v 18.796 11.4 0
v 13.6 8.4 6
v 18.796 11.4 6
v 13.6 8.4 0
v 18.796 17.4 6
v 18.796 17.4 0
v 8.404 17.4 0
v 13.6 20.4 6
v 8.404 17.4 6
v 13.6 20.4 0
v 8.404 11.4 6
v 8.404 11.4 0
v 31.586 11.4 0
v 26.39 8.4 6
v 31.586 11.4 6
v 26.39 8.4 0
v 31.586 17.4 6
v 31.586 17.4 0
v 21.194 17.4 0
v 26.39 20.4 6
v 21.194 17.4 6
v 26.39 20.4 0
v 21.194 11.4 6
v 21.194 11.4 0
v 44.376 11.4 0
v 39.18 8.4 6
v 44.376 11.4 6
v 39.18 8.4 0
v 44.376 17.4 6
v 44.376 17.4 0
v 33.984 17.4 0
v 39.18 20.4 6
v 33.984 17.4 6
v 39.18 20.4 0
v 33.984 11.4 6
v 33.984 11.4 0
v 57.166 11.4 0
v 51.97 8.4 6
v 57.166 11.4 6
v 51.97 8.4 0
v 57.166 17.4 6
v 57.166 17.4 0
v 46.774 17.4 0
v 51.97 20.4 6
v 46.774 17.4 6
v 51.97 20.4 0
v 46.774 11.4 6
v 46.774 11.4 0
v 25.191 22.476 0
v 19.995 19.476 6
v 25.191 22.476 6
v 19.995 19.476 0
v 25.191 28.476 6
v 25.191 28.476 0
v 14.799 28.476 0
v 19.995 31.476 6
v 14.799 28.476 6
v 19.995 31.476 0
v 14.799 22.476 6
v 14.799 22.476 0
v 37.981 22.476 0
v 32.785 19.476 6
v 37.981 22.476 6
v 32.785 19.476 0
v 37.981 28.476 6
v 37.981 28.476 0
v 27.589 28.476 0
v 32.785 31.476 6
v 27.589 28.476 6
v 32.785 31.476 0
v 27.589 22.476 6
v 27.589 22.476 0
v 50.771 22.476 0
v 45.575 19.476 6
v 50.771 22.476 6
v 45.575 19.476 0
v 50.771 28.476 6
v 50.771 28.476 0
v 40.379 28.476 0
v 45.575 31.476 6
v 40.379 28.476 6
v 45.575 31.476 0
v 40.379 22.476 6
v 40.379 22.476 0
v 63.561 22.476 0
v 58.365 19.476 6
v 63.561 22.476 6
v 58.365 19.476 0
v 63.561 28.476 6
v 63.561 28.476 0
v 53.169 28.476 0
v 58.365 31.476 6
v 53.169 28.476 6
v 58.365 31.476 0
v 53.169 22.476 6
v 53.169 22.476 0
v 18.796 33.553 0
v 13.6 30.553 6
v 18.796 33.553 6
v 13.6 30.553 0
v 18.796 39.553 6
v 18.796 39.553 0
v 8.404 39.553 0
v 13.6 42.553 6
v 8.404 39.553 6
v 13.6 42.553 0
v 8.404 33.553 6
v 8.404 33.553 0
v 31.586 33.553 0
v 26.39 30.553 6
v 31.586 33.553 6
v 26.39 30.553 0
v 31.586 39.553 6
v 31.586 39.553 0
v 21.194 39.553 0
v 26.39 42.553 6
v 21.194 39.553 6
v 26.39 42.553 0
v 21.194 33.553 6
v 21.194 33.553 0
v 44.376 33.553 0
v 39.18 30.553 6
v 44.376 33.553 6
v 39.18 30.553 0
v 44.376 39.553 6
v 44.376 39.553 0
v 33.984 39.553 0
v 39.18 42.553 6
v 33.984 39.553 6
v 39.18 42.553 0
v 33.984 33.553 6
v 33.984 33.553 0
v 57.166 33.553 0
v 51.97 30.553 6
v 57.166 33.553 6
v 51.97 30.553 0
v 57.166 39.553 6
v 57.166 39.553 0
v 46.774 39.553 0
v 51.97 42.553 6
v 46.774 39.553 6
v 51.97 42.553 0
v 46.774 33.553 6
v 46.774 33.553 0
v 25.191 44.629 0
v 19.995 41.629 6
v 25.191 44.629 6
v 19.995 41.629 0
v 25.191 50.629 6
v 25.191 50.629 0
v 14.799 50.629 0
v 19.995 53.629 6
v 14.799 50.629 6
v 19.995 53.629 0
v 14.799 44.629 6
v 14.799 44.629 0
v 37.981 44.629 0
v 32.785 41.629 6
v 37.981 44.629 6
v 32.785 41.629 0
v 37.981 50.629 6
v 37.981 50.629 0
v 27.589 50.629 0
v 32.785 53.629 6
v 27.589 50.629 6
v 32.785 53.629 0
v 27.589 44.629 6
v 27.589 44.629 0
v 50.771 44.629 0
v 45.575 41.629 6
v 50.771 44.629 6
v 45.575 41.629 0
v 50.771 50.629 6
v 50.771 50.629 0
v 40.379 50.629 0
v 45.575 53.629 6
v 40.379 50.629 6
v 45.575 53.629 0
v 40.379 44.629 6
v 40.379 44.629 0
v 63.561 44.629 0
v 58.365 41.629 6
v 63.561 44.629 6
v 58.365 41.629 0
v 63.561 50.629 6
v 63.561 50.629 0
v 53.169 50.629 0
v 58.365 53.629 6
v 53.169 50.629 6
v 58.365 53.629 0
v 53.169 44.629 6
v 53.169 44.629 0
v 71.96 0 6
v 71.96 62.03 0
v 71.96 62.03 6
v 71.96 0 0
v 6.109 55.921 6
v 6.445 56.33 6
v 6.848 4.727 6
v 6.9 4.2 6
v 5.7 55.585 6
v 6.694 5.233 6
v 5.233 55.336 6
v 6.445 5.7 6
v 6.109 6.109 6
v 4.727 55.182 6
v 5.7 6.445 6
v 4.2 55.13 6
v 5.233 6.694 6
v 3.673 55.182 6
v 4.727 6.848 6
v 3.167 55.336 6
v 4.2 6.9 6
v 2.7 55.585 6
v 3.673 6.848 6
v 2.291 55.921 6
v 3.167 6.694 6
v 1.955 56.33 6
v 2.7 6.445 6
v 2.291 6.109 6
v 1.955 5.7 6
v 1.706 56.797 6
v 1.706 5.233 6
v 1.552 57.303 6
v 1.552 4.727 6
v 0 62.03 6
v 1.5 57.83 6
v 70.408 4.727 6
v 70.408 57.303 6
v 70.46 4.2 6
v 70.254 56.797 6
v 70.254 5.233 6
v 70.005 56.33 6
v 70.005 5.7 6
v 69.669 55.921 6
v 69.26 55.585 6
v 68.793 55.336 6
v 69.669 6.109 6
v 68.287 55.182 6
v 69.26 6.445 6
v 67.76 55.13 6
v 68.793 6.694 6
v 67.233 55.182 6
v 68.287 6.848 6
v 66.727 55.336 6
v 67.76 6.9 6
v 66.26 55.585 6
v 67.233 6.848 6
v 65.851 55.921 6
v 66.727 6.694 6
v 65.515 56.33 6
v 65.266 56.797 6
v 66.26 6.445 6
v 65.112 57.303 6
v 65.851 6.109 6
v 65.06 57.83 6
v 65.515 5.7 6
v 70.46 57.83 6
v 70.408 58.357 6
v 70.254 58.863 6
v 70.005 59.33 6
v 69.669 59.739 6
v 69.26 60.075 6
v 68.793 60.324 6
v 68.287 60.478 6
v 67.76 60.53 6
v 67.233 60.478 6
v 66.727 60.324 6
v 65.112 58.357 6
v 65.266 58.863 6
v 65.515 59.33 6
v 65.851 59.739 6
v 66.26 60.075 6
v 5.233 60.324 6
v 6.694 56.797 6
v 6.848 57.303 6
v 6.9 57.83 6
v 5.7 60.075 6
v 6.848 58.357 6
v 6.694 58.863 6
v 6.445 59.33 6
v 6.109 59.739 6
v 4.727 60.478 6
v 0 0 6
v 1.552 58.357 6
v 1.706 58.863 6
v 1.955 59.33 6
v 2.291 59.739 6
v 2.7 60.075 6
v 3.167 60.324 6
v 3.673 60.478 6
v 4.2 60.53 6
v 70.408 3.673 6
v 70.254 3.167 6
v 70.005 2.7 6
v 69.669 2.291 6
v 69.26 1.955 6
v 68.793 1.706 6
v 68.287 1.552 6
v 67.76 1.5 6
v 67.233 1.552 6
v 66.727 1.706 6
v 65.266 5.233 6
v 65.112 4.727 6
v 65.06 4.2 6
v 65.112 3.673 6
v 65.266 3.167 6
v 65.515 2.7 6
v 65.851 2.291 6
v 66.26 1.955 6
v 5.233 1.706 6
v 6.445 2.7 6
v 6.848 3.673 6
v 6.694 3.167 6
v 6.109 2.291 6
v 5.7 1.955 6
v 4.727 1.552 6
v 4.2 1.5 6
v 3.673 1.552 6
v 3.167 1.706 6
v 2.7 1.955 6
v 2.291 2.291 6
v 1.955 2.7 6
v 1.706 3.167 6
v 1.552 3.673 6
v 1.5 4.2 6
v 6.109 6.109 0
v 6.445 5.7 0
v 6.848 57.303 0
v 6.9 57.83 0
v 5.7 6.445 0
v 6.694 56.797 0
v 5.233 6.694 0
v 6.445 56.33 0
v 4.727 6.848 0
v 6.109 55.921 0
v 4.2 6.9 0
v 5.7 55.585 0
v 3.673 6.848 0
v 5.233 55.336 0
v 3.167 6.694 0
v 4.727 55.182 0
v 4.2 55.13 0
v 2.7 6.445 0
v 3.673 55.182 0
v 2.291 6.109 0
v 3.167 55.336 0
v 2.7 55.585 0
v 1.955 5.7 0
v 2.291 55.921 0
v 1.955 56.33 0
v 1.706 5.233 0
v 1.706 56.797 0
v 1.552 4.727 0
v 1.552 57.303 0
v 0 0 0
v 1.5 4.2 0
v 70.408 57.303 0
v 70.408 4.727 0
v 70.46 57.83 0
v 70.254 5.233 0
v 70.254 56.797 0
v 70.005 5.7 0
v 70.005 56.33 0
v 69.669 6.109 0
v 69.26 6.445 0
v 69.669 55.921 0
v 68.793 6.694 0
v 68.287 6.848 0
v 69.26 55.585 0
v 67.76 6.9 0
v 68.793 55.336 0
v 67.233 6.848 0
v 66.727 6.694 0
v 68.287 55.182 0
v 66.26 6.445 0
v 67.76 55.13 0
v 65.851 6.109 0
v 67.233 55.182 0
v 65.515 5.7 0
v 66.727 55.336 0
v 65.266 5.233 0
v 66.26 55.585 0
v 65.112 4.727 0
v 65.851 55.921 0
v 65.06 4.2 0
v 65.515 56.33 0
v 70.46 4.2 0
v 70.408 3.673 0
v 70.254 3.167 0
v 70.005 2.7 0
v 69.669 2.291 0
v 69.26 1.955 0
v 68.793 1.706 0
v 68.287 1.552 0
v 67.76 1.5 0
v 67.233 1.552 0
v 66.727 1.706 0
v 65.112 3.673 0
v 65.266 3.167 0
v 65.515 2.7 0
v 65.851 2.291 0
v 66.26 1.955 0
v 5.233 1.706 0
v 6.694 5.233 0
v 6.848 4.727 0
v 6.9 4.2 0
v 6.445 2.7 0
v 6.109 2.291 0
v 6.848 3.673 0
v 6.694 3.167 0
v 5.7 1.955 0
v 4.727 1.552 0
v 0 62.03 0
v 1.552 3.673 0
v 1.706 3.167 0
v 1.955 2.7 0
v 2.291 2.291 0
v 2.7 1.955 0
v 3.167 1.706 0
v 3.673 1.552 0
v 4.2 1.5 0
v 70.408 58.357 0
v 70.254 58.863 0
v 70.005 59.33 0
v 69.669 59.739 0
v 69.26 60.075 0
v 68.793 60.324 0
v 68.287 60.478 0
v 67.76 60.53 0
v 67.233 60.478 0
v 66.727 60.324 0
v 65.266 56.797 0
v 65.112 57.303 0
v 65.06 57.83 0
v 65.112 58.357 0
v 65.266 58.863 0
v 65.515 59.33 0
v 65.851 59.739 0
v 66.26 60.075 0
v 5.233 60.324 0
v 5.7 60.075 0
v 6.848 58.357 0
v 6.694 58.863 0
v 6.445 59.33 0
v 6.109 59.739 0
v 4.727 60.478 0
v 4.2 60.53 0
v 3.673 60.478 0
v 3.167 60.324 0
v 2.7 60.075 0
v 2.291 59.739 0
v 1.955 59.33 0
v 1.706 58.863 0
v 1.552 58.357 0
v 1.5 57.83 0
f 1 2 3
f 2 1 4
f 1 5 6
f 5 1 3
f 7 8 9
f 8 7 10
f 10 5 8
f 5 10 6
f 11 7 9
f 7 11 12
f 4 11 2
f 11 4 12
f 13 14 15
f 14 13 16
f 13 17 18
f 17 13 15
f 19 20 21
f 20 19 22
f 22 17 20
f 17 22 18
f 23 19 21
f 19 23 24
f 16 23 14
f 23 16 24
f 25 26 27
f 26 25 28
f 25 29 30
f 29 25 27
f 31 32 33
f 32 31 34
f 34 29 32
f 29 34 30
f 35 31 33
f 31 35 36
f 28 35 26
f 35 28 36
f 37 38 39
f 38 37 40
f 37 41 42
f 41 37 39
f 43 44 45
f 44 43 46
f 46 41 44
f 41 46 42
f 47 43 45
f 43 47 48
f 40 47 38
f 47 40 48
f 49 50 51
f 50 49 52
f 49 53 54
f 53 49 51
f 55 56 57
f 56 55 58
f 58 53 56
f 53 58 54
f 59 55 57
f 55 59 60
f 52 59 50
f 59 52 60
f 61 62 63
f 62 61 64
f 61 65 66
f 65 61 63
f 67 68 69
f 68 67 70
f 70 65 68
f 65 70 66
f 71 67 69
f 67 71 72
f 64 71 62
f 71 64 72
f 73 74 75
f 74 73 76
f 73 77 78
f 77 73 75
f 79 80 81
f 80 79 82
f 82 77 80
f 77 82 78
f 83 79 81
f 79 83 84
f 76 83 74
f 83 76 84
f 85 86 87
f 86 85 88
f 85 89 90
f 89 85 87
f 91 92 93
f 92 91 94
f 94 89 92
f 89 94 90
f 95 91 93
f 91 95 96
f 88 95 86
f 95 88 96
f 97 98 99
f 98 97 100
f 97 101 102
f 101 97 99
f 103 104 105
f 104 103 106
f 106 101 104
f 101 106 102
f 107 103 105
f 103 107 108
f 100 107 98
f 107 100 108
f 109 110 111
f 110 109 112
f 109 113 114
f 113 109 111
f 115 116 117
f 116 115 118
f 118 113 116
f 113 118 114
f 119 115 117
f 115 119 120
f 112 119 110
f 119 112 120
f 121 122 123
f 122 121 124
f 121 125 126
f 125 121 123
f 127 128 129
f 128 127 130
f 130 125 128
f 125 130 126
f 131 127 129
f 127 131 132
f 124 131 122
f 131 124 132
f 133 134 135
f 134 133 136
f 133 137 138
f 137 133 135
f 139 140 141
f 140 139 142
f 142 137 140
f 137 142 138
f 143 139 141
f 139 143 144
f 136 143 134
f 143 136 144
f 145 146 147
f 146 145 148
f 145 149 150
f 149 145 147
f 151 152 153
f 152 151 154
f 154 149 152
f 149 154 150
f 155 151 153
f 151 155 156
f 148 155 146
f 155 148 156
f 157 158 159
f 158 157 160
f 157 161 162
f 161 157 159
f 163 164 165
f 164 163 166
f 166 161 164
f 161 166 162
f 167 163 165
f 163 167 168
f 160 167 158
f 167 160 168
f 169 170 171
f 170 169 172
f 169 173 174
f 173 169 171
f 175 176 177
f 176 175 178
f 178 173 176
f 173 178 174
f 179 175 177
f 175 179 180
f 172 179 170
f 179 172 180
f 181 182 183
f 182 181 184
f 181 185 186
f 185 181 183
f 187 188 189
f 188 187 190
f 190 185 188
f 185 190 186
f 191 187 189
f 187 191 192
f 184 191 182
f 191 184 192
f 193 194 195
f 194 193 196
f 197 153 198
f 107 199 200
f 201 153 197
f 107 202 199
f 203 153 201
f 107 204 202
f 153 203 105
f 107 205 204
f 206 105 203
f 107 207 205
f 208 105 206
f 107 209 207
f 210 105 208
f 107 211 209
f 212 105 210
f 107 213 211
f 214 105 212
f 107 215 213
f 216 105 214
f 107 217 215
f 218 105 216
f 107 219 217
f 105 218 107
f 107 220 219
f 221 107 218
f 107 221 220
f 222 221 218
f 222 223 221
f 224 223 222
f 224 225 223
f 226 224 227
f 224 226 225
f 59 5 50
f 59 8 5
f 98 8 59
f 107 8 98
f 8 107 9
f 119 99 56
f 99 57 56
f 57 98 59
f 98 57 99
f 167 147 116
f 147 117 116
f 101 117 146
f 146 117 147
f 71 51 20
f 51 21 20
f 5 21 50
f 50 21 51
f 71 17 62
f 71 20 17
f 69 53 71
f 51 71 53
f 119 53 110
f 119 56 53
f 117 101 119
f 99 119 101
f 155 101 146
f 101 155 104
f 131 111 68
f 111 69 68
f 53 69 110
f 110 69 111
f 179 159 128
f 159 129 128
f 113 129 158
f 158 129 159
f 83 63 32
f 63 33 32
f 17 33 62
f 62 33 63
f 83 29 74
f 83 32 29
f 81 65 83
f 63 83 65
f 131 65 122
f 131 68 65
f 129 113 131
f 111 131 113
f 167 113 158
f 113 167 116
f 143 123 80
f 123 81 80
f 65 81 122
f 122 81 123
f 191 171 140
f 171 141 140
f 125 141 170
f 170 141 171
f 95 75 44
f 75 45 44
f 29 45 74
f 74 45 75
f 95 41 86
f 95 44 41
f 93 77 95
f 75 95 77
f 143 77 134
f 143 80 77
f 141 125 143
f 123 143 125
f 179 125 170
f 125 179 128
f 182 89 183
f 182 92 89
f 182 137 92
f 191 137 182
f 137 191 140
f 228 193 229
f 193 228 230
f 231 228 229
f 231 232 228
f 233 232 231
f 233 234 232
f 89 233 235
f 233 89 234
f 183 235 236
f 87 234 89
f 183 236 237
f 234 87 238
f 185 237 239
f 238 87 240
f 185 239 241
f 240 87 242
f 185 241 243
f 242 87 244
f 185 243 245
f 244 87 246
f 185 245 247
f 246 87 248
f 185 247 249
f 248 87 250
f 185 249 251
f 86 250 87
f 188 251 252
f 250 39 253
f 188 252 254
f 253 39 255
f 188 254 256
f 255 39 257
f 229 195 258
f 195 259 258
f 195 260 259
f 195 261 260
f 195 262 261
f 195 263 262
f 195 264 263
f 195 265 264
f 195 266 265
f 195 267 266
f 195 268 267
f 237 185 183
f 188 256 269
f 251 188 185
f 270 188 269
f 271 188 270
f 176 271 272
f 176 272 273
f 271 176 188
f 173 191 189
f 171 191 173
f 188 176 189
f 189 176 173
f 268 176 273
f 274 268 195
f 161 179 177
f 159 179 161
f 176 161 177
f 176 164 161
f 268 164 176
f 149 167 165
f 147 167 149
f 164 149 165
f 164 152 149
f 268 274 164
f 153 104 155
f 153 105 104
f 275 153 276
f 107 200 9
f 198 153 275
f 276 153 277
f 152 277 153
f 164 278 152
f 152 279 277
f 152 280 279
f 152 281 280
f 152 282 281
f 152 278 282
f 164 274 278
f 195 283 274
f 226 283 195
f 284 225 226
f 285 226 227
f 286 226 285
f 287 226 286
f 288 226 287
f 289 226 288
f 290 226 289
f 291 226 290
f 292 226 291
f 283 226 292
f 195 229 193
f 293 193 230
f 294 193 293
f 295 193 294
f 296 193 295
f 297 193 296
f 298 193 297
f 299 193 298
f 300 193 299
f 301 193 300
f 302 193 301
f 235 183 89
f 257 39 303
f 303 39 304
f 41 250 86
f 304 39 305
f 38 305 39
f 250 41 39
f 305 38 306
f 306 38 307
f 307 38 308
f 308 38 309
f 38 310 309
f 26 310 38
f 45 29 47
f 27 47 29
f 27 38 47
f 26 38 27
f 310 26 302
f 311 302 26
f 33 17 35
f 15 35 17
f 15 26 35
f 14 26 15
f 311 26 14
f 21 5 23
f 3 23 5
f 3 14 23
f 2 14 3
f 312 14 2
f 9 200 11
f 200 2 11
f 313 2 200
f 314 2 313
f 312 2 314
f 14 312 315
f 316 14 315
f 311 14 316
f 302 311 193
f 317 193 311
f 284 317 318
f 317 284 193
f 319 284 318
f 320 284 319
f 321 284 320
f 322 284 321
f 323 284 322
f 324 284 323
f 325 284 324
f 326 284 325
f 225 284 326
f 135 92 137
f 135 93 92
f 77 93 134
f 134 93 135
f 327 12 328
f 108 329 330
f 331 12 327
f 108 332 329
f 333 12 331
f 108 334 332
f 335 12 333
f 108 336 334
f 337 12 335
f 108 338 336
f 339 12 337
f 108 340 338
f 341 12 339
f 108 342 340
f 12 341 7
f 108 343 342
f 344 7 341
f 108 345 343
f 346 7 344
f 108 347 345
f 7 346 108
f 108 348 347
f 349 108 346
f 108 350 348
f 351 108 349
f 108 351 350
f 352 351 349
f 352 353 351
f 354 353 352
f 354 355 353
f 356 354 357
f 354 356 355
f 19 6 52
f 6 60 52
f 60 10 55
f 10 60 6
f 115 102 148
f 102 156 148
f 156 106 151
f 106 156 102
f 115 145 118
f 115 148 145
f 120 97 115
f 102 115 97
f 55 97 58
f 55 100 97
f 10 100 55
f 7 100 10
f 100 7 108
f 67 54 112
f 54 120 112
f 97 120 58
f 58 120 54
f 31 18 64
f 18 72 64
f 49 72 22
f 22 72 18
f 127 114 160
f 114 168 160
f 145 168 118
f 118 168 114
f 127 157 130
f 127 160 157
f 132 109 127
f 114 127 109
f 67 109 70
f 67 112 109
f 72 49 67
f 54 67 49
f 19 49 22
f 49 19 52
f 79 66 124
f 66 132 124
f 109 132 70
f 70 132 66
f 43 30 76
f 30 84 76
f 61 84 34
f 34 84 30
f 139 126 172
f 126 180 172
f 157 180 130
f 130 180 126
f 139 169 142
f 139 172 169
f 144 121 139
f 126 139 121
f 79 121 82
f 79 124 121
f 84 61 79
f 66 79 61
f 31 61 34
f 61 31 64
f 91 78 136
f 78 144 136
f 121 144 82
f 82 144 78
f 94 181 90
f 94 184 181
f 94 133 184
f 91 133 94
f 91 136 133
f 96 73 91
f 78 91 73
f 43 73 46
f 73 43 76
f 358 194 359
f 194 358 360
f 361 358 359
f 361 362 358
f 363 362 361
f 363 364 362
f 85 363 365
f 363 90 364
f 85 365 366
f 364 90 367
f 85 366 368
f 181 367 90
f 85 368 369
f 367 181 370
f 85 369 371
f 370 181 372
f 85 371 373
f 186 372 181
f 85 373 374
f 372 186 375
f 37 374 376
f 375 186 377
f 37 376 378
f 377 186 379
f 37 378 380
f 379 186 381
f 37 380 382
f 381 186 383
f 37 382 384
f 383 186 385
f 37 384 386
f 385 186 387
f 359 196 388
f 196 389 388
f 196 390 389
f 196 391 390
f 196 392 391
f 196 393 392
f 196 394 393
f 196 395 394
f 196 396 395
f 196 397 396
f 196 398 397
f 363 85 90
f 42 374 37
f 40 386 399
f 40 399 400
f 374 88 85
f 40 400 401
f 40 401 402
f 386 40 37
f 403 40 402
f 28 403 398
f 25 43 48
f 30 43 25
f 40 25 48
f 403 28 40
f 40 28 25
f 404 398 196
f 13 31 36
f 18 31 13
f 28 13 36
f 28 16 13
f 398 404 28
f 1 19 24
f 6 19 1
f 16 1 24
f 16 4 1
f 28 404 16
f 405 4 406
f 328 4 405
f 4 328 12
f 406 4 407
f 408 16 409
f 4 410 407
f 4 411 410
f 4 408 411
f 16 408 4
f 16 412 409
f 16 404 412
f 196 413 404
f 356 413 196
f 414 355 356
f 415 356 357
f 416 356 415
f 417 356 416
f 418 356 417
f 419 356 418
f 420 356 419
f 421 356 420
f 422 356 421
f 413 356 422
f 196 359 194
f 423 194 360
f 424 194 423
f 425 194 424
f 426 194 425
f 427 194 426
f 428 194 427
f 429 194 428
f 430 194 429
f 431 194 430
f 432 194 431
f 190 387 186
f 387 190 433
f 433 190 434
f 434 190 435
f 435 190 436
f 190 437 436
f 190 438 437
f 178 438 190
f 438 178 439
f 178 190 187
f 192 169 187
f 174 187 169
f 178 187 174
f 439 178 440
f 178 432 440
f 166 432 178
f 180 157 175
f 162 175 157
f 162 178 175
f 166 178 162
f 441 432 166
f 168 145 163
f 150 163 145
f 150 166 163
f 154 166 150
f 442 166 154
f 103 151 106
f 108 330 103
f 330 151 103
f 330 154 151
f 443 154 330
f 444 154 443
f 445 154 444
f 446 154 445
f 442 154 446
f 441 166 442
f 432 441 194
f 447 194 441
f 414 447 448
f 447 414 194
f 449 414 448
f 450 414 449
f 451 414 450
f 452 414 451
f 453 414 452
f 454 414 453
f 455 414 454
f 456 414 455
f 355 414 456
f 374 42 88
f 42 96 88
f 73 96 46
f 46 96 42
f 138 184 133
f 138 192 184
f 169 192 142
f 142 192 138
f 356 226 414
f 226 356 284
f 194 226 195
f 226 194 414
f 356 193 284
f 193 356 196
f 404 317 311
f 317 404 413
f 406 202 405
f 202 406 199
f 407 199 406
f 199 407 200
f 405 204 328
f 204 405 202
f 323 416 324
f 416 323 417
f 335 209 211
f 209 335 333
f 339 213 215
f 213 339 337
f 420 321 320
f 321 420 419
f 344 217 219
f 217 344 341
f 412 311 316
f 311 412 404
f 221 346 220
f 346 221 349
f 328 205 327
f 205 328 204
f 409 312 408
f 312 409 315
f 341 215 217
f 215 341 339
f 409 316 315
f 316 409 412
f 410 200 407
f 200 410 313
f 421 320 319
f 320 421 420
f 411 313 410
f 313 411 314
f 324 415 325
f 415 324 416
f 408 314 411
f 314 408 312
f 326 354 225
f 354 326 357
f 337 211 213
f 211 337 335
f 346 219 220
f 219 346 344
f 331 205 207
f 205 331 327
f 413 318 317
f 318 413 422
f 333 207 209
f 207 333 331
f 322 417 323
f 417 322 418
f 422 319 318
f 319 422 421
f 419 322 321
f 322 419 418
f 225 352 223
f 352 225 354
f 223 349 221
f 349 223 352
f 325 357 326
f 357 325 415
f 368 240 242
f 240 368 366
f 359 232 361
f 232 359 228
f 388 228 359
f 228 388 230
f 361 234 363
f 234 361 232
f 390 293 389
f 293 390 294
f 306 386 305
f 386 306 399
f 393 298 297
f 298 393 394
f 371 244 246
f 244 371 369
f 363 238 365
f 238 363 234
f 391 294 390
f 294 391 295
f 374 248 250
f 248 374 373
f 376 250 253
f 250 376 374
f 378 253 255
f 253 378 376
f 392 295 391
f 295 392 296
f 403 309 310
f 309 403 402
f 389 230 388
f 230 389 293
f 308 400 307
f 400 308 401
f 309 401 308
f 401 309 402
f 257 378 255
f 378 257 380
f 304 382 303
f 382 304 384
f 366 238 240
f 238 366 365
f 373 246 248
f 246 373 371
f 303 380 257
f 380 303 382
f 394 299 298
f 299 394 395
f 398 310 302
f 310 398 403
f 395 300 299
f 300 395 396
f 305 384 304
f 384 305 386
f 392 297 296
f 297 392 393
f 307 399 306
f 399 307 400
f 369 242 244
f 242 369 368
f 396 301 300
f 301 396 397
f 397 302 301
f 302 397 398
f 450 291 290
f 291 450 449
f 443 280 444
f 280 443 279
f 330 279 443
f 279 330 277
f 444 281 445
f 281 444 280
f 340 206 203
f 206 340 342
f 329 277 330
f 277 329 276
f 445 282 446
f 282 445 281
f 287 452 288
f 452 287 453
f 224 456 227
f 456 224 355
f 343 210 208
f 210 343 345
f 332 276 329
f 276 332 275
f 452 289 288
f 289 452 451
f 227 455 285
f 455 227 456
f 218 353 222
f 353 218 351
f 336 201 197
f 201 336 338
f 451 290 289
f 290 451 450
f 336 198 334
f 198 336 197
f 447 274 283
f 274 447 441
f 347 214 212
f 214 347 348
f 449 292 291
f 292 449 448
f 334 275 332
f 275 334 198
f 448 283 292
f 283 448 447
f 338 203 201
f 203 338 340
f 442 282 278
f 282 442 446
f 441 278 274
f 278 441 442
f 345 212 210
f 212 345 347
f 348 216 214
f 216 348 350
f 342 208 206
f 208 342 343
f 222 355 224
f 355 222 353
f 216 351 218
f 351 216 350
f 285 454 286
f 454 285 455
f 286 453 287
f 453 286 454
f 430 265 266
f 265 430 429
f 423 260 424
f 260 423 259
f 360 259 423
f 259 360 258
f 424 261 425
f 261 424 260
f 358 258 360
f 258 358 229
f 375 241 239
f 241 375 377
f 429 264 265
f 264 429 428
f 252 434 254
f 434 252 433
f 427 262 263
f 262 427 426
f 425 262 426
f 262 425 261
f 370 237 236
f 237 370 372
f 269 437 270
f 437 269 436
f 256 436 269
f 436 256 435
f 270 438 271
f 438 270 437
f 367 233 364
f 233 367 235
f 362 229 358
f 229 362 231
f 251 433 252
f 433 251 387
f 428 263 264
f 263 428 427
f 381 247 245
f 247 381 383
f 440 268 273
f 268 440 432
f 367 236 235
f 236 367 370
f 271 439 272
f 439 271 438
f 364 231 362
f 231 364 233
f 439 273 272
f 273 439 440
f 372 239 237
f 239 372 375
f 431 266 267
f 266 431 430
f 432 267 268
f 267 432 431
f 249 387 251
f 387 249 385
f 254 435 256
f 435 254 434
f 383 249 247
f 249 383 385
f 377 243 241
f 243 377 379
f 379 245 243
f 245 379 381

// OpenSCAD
$fn = 32;

// ----------------------------------------------------------------------
// Honeycomb panel: 71.96 x 62.03 mm, 16 cells of 12 mm
// ----------------------------------------------------------------------

// --- parameters (mm) ---
panel_w = 71.96;          // panel width
panel_d = 62.03;          // panel depth
thick = 6;                // panel thickness
cell_r = 6;               // hex cell circumradius
pitch = 12.79;            // hex cell pitch (centre to centre)
web = 2.4;                // web between the cells
columns = 4;              // columns of cells
rows = 4;                 // rows of cells
cell_count = 16;          // total cells
shift_x = 13.6;           // first cell offset in x
shift_y = 14.4;           // first cell offset in y
mount_d = 5.4;            // corner mounting holes
hole_off = 4.2;           // mounting hole offset from the corners

difference() {
  union() {
    cube([panel_w, panel_d, thick]);
  }
  /* hexagonal cells, point-up, cut right through the plate */
  for (row = [0 : rows - 1]) {
    for (col = [0 : columns - 1]) {
      translate([shift_x + col * pitch + (row % 2) * pitch / 2, shift_y + row * pitch * 0.866025, -2.5]) rotate([0, 0, 30]) cylinder(h = thick + 5, d = 2 * cell_r, $fn = 6);
    }
  }
  /* corner mounting holes, clear of the outer cell web */
  translate([4.2, 4.2, -2.5]) cylinder(h = thick + 5, d = mount_d);
  translate([67.76, 4.2, -2.5]) cylinder(h = thick + 5, d = mount_d);
  translate([4.2, 57.83, -2.5]) cylinder(h = thick + 5, d = mount_d);
  translate([67.76, 57.83, -2.5]) cylinder(h = thick + 5, d = mount_d);
}
